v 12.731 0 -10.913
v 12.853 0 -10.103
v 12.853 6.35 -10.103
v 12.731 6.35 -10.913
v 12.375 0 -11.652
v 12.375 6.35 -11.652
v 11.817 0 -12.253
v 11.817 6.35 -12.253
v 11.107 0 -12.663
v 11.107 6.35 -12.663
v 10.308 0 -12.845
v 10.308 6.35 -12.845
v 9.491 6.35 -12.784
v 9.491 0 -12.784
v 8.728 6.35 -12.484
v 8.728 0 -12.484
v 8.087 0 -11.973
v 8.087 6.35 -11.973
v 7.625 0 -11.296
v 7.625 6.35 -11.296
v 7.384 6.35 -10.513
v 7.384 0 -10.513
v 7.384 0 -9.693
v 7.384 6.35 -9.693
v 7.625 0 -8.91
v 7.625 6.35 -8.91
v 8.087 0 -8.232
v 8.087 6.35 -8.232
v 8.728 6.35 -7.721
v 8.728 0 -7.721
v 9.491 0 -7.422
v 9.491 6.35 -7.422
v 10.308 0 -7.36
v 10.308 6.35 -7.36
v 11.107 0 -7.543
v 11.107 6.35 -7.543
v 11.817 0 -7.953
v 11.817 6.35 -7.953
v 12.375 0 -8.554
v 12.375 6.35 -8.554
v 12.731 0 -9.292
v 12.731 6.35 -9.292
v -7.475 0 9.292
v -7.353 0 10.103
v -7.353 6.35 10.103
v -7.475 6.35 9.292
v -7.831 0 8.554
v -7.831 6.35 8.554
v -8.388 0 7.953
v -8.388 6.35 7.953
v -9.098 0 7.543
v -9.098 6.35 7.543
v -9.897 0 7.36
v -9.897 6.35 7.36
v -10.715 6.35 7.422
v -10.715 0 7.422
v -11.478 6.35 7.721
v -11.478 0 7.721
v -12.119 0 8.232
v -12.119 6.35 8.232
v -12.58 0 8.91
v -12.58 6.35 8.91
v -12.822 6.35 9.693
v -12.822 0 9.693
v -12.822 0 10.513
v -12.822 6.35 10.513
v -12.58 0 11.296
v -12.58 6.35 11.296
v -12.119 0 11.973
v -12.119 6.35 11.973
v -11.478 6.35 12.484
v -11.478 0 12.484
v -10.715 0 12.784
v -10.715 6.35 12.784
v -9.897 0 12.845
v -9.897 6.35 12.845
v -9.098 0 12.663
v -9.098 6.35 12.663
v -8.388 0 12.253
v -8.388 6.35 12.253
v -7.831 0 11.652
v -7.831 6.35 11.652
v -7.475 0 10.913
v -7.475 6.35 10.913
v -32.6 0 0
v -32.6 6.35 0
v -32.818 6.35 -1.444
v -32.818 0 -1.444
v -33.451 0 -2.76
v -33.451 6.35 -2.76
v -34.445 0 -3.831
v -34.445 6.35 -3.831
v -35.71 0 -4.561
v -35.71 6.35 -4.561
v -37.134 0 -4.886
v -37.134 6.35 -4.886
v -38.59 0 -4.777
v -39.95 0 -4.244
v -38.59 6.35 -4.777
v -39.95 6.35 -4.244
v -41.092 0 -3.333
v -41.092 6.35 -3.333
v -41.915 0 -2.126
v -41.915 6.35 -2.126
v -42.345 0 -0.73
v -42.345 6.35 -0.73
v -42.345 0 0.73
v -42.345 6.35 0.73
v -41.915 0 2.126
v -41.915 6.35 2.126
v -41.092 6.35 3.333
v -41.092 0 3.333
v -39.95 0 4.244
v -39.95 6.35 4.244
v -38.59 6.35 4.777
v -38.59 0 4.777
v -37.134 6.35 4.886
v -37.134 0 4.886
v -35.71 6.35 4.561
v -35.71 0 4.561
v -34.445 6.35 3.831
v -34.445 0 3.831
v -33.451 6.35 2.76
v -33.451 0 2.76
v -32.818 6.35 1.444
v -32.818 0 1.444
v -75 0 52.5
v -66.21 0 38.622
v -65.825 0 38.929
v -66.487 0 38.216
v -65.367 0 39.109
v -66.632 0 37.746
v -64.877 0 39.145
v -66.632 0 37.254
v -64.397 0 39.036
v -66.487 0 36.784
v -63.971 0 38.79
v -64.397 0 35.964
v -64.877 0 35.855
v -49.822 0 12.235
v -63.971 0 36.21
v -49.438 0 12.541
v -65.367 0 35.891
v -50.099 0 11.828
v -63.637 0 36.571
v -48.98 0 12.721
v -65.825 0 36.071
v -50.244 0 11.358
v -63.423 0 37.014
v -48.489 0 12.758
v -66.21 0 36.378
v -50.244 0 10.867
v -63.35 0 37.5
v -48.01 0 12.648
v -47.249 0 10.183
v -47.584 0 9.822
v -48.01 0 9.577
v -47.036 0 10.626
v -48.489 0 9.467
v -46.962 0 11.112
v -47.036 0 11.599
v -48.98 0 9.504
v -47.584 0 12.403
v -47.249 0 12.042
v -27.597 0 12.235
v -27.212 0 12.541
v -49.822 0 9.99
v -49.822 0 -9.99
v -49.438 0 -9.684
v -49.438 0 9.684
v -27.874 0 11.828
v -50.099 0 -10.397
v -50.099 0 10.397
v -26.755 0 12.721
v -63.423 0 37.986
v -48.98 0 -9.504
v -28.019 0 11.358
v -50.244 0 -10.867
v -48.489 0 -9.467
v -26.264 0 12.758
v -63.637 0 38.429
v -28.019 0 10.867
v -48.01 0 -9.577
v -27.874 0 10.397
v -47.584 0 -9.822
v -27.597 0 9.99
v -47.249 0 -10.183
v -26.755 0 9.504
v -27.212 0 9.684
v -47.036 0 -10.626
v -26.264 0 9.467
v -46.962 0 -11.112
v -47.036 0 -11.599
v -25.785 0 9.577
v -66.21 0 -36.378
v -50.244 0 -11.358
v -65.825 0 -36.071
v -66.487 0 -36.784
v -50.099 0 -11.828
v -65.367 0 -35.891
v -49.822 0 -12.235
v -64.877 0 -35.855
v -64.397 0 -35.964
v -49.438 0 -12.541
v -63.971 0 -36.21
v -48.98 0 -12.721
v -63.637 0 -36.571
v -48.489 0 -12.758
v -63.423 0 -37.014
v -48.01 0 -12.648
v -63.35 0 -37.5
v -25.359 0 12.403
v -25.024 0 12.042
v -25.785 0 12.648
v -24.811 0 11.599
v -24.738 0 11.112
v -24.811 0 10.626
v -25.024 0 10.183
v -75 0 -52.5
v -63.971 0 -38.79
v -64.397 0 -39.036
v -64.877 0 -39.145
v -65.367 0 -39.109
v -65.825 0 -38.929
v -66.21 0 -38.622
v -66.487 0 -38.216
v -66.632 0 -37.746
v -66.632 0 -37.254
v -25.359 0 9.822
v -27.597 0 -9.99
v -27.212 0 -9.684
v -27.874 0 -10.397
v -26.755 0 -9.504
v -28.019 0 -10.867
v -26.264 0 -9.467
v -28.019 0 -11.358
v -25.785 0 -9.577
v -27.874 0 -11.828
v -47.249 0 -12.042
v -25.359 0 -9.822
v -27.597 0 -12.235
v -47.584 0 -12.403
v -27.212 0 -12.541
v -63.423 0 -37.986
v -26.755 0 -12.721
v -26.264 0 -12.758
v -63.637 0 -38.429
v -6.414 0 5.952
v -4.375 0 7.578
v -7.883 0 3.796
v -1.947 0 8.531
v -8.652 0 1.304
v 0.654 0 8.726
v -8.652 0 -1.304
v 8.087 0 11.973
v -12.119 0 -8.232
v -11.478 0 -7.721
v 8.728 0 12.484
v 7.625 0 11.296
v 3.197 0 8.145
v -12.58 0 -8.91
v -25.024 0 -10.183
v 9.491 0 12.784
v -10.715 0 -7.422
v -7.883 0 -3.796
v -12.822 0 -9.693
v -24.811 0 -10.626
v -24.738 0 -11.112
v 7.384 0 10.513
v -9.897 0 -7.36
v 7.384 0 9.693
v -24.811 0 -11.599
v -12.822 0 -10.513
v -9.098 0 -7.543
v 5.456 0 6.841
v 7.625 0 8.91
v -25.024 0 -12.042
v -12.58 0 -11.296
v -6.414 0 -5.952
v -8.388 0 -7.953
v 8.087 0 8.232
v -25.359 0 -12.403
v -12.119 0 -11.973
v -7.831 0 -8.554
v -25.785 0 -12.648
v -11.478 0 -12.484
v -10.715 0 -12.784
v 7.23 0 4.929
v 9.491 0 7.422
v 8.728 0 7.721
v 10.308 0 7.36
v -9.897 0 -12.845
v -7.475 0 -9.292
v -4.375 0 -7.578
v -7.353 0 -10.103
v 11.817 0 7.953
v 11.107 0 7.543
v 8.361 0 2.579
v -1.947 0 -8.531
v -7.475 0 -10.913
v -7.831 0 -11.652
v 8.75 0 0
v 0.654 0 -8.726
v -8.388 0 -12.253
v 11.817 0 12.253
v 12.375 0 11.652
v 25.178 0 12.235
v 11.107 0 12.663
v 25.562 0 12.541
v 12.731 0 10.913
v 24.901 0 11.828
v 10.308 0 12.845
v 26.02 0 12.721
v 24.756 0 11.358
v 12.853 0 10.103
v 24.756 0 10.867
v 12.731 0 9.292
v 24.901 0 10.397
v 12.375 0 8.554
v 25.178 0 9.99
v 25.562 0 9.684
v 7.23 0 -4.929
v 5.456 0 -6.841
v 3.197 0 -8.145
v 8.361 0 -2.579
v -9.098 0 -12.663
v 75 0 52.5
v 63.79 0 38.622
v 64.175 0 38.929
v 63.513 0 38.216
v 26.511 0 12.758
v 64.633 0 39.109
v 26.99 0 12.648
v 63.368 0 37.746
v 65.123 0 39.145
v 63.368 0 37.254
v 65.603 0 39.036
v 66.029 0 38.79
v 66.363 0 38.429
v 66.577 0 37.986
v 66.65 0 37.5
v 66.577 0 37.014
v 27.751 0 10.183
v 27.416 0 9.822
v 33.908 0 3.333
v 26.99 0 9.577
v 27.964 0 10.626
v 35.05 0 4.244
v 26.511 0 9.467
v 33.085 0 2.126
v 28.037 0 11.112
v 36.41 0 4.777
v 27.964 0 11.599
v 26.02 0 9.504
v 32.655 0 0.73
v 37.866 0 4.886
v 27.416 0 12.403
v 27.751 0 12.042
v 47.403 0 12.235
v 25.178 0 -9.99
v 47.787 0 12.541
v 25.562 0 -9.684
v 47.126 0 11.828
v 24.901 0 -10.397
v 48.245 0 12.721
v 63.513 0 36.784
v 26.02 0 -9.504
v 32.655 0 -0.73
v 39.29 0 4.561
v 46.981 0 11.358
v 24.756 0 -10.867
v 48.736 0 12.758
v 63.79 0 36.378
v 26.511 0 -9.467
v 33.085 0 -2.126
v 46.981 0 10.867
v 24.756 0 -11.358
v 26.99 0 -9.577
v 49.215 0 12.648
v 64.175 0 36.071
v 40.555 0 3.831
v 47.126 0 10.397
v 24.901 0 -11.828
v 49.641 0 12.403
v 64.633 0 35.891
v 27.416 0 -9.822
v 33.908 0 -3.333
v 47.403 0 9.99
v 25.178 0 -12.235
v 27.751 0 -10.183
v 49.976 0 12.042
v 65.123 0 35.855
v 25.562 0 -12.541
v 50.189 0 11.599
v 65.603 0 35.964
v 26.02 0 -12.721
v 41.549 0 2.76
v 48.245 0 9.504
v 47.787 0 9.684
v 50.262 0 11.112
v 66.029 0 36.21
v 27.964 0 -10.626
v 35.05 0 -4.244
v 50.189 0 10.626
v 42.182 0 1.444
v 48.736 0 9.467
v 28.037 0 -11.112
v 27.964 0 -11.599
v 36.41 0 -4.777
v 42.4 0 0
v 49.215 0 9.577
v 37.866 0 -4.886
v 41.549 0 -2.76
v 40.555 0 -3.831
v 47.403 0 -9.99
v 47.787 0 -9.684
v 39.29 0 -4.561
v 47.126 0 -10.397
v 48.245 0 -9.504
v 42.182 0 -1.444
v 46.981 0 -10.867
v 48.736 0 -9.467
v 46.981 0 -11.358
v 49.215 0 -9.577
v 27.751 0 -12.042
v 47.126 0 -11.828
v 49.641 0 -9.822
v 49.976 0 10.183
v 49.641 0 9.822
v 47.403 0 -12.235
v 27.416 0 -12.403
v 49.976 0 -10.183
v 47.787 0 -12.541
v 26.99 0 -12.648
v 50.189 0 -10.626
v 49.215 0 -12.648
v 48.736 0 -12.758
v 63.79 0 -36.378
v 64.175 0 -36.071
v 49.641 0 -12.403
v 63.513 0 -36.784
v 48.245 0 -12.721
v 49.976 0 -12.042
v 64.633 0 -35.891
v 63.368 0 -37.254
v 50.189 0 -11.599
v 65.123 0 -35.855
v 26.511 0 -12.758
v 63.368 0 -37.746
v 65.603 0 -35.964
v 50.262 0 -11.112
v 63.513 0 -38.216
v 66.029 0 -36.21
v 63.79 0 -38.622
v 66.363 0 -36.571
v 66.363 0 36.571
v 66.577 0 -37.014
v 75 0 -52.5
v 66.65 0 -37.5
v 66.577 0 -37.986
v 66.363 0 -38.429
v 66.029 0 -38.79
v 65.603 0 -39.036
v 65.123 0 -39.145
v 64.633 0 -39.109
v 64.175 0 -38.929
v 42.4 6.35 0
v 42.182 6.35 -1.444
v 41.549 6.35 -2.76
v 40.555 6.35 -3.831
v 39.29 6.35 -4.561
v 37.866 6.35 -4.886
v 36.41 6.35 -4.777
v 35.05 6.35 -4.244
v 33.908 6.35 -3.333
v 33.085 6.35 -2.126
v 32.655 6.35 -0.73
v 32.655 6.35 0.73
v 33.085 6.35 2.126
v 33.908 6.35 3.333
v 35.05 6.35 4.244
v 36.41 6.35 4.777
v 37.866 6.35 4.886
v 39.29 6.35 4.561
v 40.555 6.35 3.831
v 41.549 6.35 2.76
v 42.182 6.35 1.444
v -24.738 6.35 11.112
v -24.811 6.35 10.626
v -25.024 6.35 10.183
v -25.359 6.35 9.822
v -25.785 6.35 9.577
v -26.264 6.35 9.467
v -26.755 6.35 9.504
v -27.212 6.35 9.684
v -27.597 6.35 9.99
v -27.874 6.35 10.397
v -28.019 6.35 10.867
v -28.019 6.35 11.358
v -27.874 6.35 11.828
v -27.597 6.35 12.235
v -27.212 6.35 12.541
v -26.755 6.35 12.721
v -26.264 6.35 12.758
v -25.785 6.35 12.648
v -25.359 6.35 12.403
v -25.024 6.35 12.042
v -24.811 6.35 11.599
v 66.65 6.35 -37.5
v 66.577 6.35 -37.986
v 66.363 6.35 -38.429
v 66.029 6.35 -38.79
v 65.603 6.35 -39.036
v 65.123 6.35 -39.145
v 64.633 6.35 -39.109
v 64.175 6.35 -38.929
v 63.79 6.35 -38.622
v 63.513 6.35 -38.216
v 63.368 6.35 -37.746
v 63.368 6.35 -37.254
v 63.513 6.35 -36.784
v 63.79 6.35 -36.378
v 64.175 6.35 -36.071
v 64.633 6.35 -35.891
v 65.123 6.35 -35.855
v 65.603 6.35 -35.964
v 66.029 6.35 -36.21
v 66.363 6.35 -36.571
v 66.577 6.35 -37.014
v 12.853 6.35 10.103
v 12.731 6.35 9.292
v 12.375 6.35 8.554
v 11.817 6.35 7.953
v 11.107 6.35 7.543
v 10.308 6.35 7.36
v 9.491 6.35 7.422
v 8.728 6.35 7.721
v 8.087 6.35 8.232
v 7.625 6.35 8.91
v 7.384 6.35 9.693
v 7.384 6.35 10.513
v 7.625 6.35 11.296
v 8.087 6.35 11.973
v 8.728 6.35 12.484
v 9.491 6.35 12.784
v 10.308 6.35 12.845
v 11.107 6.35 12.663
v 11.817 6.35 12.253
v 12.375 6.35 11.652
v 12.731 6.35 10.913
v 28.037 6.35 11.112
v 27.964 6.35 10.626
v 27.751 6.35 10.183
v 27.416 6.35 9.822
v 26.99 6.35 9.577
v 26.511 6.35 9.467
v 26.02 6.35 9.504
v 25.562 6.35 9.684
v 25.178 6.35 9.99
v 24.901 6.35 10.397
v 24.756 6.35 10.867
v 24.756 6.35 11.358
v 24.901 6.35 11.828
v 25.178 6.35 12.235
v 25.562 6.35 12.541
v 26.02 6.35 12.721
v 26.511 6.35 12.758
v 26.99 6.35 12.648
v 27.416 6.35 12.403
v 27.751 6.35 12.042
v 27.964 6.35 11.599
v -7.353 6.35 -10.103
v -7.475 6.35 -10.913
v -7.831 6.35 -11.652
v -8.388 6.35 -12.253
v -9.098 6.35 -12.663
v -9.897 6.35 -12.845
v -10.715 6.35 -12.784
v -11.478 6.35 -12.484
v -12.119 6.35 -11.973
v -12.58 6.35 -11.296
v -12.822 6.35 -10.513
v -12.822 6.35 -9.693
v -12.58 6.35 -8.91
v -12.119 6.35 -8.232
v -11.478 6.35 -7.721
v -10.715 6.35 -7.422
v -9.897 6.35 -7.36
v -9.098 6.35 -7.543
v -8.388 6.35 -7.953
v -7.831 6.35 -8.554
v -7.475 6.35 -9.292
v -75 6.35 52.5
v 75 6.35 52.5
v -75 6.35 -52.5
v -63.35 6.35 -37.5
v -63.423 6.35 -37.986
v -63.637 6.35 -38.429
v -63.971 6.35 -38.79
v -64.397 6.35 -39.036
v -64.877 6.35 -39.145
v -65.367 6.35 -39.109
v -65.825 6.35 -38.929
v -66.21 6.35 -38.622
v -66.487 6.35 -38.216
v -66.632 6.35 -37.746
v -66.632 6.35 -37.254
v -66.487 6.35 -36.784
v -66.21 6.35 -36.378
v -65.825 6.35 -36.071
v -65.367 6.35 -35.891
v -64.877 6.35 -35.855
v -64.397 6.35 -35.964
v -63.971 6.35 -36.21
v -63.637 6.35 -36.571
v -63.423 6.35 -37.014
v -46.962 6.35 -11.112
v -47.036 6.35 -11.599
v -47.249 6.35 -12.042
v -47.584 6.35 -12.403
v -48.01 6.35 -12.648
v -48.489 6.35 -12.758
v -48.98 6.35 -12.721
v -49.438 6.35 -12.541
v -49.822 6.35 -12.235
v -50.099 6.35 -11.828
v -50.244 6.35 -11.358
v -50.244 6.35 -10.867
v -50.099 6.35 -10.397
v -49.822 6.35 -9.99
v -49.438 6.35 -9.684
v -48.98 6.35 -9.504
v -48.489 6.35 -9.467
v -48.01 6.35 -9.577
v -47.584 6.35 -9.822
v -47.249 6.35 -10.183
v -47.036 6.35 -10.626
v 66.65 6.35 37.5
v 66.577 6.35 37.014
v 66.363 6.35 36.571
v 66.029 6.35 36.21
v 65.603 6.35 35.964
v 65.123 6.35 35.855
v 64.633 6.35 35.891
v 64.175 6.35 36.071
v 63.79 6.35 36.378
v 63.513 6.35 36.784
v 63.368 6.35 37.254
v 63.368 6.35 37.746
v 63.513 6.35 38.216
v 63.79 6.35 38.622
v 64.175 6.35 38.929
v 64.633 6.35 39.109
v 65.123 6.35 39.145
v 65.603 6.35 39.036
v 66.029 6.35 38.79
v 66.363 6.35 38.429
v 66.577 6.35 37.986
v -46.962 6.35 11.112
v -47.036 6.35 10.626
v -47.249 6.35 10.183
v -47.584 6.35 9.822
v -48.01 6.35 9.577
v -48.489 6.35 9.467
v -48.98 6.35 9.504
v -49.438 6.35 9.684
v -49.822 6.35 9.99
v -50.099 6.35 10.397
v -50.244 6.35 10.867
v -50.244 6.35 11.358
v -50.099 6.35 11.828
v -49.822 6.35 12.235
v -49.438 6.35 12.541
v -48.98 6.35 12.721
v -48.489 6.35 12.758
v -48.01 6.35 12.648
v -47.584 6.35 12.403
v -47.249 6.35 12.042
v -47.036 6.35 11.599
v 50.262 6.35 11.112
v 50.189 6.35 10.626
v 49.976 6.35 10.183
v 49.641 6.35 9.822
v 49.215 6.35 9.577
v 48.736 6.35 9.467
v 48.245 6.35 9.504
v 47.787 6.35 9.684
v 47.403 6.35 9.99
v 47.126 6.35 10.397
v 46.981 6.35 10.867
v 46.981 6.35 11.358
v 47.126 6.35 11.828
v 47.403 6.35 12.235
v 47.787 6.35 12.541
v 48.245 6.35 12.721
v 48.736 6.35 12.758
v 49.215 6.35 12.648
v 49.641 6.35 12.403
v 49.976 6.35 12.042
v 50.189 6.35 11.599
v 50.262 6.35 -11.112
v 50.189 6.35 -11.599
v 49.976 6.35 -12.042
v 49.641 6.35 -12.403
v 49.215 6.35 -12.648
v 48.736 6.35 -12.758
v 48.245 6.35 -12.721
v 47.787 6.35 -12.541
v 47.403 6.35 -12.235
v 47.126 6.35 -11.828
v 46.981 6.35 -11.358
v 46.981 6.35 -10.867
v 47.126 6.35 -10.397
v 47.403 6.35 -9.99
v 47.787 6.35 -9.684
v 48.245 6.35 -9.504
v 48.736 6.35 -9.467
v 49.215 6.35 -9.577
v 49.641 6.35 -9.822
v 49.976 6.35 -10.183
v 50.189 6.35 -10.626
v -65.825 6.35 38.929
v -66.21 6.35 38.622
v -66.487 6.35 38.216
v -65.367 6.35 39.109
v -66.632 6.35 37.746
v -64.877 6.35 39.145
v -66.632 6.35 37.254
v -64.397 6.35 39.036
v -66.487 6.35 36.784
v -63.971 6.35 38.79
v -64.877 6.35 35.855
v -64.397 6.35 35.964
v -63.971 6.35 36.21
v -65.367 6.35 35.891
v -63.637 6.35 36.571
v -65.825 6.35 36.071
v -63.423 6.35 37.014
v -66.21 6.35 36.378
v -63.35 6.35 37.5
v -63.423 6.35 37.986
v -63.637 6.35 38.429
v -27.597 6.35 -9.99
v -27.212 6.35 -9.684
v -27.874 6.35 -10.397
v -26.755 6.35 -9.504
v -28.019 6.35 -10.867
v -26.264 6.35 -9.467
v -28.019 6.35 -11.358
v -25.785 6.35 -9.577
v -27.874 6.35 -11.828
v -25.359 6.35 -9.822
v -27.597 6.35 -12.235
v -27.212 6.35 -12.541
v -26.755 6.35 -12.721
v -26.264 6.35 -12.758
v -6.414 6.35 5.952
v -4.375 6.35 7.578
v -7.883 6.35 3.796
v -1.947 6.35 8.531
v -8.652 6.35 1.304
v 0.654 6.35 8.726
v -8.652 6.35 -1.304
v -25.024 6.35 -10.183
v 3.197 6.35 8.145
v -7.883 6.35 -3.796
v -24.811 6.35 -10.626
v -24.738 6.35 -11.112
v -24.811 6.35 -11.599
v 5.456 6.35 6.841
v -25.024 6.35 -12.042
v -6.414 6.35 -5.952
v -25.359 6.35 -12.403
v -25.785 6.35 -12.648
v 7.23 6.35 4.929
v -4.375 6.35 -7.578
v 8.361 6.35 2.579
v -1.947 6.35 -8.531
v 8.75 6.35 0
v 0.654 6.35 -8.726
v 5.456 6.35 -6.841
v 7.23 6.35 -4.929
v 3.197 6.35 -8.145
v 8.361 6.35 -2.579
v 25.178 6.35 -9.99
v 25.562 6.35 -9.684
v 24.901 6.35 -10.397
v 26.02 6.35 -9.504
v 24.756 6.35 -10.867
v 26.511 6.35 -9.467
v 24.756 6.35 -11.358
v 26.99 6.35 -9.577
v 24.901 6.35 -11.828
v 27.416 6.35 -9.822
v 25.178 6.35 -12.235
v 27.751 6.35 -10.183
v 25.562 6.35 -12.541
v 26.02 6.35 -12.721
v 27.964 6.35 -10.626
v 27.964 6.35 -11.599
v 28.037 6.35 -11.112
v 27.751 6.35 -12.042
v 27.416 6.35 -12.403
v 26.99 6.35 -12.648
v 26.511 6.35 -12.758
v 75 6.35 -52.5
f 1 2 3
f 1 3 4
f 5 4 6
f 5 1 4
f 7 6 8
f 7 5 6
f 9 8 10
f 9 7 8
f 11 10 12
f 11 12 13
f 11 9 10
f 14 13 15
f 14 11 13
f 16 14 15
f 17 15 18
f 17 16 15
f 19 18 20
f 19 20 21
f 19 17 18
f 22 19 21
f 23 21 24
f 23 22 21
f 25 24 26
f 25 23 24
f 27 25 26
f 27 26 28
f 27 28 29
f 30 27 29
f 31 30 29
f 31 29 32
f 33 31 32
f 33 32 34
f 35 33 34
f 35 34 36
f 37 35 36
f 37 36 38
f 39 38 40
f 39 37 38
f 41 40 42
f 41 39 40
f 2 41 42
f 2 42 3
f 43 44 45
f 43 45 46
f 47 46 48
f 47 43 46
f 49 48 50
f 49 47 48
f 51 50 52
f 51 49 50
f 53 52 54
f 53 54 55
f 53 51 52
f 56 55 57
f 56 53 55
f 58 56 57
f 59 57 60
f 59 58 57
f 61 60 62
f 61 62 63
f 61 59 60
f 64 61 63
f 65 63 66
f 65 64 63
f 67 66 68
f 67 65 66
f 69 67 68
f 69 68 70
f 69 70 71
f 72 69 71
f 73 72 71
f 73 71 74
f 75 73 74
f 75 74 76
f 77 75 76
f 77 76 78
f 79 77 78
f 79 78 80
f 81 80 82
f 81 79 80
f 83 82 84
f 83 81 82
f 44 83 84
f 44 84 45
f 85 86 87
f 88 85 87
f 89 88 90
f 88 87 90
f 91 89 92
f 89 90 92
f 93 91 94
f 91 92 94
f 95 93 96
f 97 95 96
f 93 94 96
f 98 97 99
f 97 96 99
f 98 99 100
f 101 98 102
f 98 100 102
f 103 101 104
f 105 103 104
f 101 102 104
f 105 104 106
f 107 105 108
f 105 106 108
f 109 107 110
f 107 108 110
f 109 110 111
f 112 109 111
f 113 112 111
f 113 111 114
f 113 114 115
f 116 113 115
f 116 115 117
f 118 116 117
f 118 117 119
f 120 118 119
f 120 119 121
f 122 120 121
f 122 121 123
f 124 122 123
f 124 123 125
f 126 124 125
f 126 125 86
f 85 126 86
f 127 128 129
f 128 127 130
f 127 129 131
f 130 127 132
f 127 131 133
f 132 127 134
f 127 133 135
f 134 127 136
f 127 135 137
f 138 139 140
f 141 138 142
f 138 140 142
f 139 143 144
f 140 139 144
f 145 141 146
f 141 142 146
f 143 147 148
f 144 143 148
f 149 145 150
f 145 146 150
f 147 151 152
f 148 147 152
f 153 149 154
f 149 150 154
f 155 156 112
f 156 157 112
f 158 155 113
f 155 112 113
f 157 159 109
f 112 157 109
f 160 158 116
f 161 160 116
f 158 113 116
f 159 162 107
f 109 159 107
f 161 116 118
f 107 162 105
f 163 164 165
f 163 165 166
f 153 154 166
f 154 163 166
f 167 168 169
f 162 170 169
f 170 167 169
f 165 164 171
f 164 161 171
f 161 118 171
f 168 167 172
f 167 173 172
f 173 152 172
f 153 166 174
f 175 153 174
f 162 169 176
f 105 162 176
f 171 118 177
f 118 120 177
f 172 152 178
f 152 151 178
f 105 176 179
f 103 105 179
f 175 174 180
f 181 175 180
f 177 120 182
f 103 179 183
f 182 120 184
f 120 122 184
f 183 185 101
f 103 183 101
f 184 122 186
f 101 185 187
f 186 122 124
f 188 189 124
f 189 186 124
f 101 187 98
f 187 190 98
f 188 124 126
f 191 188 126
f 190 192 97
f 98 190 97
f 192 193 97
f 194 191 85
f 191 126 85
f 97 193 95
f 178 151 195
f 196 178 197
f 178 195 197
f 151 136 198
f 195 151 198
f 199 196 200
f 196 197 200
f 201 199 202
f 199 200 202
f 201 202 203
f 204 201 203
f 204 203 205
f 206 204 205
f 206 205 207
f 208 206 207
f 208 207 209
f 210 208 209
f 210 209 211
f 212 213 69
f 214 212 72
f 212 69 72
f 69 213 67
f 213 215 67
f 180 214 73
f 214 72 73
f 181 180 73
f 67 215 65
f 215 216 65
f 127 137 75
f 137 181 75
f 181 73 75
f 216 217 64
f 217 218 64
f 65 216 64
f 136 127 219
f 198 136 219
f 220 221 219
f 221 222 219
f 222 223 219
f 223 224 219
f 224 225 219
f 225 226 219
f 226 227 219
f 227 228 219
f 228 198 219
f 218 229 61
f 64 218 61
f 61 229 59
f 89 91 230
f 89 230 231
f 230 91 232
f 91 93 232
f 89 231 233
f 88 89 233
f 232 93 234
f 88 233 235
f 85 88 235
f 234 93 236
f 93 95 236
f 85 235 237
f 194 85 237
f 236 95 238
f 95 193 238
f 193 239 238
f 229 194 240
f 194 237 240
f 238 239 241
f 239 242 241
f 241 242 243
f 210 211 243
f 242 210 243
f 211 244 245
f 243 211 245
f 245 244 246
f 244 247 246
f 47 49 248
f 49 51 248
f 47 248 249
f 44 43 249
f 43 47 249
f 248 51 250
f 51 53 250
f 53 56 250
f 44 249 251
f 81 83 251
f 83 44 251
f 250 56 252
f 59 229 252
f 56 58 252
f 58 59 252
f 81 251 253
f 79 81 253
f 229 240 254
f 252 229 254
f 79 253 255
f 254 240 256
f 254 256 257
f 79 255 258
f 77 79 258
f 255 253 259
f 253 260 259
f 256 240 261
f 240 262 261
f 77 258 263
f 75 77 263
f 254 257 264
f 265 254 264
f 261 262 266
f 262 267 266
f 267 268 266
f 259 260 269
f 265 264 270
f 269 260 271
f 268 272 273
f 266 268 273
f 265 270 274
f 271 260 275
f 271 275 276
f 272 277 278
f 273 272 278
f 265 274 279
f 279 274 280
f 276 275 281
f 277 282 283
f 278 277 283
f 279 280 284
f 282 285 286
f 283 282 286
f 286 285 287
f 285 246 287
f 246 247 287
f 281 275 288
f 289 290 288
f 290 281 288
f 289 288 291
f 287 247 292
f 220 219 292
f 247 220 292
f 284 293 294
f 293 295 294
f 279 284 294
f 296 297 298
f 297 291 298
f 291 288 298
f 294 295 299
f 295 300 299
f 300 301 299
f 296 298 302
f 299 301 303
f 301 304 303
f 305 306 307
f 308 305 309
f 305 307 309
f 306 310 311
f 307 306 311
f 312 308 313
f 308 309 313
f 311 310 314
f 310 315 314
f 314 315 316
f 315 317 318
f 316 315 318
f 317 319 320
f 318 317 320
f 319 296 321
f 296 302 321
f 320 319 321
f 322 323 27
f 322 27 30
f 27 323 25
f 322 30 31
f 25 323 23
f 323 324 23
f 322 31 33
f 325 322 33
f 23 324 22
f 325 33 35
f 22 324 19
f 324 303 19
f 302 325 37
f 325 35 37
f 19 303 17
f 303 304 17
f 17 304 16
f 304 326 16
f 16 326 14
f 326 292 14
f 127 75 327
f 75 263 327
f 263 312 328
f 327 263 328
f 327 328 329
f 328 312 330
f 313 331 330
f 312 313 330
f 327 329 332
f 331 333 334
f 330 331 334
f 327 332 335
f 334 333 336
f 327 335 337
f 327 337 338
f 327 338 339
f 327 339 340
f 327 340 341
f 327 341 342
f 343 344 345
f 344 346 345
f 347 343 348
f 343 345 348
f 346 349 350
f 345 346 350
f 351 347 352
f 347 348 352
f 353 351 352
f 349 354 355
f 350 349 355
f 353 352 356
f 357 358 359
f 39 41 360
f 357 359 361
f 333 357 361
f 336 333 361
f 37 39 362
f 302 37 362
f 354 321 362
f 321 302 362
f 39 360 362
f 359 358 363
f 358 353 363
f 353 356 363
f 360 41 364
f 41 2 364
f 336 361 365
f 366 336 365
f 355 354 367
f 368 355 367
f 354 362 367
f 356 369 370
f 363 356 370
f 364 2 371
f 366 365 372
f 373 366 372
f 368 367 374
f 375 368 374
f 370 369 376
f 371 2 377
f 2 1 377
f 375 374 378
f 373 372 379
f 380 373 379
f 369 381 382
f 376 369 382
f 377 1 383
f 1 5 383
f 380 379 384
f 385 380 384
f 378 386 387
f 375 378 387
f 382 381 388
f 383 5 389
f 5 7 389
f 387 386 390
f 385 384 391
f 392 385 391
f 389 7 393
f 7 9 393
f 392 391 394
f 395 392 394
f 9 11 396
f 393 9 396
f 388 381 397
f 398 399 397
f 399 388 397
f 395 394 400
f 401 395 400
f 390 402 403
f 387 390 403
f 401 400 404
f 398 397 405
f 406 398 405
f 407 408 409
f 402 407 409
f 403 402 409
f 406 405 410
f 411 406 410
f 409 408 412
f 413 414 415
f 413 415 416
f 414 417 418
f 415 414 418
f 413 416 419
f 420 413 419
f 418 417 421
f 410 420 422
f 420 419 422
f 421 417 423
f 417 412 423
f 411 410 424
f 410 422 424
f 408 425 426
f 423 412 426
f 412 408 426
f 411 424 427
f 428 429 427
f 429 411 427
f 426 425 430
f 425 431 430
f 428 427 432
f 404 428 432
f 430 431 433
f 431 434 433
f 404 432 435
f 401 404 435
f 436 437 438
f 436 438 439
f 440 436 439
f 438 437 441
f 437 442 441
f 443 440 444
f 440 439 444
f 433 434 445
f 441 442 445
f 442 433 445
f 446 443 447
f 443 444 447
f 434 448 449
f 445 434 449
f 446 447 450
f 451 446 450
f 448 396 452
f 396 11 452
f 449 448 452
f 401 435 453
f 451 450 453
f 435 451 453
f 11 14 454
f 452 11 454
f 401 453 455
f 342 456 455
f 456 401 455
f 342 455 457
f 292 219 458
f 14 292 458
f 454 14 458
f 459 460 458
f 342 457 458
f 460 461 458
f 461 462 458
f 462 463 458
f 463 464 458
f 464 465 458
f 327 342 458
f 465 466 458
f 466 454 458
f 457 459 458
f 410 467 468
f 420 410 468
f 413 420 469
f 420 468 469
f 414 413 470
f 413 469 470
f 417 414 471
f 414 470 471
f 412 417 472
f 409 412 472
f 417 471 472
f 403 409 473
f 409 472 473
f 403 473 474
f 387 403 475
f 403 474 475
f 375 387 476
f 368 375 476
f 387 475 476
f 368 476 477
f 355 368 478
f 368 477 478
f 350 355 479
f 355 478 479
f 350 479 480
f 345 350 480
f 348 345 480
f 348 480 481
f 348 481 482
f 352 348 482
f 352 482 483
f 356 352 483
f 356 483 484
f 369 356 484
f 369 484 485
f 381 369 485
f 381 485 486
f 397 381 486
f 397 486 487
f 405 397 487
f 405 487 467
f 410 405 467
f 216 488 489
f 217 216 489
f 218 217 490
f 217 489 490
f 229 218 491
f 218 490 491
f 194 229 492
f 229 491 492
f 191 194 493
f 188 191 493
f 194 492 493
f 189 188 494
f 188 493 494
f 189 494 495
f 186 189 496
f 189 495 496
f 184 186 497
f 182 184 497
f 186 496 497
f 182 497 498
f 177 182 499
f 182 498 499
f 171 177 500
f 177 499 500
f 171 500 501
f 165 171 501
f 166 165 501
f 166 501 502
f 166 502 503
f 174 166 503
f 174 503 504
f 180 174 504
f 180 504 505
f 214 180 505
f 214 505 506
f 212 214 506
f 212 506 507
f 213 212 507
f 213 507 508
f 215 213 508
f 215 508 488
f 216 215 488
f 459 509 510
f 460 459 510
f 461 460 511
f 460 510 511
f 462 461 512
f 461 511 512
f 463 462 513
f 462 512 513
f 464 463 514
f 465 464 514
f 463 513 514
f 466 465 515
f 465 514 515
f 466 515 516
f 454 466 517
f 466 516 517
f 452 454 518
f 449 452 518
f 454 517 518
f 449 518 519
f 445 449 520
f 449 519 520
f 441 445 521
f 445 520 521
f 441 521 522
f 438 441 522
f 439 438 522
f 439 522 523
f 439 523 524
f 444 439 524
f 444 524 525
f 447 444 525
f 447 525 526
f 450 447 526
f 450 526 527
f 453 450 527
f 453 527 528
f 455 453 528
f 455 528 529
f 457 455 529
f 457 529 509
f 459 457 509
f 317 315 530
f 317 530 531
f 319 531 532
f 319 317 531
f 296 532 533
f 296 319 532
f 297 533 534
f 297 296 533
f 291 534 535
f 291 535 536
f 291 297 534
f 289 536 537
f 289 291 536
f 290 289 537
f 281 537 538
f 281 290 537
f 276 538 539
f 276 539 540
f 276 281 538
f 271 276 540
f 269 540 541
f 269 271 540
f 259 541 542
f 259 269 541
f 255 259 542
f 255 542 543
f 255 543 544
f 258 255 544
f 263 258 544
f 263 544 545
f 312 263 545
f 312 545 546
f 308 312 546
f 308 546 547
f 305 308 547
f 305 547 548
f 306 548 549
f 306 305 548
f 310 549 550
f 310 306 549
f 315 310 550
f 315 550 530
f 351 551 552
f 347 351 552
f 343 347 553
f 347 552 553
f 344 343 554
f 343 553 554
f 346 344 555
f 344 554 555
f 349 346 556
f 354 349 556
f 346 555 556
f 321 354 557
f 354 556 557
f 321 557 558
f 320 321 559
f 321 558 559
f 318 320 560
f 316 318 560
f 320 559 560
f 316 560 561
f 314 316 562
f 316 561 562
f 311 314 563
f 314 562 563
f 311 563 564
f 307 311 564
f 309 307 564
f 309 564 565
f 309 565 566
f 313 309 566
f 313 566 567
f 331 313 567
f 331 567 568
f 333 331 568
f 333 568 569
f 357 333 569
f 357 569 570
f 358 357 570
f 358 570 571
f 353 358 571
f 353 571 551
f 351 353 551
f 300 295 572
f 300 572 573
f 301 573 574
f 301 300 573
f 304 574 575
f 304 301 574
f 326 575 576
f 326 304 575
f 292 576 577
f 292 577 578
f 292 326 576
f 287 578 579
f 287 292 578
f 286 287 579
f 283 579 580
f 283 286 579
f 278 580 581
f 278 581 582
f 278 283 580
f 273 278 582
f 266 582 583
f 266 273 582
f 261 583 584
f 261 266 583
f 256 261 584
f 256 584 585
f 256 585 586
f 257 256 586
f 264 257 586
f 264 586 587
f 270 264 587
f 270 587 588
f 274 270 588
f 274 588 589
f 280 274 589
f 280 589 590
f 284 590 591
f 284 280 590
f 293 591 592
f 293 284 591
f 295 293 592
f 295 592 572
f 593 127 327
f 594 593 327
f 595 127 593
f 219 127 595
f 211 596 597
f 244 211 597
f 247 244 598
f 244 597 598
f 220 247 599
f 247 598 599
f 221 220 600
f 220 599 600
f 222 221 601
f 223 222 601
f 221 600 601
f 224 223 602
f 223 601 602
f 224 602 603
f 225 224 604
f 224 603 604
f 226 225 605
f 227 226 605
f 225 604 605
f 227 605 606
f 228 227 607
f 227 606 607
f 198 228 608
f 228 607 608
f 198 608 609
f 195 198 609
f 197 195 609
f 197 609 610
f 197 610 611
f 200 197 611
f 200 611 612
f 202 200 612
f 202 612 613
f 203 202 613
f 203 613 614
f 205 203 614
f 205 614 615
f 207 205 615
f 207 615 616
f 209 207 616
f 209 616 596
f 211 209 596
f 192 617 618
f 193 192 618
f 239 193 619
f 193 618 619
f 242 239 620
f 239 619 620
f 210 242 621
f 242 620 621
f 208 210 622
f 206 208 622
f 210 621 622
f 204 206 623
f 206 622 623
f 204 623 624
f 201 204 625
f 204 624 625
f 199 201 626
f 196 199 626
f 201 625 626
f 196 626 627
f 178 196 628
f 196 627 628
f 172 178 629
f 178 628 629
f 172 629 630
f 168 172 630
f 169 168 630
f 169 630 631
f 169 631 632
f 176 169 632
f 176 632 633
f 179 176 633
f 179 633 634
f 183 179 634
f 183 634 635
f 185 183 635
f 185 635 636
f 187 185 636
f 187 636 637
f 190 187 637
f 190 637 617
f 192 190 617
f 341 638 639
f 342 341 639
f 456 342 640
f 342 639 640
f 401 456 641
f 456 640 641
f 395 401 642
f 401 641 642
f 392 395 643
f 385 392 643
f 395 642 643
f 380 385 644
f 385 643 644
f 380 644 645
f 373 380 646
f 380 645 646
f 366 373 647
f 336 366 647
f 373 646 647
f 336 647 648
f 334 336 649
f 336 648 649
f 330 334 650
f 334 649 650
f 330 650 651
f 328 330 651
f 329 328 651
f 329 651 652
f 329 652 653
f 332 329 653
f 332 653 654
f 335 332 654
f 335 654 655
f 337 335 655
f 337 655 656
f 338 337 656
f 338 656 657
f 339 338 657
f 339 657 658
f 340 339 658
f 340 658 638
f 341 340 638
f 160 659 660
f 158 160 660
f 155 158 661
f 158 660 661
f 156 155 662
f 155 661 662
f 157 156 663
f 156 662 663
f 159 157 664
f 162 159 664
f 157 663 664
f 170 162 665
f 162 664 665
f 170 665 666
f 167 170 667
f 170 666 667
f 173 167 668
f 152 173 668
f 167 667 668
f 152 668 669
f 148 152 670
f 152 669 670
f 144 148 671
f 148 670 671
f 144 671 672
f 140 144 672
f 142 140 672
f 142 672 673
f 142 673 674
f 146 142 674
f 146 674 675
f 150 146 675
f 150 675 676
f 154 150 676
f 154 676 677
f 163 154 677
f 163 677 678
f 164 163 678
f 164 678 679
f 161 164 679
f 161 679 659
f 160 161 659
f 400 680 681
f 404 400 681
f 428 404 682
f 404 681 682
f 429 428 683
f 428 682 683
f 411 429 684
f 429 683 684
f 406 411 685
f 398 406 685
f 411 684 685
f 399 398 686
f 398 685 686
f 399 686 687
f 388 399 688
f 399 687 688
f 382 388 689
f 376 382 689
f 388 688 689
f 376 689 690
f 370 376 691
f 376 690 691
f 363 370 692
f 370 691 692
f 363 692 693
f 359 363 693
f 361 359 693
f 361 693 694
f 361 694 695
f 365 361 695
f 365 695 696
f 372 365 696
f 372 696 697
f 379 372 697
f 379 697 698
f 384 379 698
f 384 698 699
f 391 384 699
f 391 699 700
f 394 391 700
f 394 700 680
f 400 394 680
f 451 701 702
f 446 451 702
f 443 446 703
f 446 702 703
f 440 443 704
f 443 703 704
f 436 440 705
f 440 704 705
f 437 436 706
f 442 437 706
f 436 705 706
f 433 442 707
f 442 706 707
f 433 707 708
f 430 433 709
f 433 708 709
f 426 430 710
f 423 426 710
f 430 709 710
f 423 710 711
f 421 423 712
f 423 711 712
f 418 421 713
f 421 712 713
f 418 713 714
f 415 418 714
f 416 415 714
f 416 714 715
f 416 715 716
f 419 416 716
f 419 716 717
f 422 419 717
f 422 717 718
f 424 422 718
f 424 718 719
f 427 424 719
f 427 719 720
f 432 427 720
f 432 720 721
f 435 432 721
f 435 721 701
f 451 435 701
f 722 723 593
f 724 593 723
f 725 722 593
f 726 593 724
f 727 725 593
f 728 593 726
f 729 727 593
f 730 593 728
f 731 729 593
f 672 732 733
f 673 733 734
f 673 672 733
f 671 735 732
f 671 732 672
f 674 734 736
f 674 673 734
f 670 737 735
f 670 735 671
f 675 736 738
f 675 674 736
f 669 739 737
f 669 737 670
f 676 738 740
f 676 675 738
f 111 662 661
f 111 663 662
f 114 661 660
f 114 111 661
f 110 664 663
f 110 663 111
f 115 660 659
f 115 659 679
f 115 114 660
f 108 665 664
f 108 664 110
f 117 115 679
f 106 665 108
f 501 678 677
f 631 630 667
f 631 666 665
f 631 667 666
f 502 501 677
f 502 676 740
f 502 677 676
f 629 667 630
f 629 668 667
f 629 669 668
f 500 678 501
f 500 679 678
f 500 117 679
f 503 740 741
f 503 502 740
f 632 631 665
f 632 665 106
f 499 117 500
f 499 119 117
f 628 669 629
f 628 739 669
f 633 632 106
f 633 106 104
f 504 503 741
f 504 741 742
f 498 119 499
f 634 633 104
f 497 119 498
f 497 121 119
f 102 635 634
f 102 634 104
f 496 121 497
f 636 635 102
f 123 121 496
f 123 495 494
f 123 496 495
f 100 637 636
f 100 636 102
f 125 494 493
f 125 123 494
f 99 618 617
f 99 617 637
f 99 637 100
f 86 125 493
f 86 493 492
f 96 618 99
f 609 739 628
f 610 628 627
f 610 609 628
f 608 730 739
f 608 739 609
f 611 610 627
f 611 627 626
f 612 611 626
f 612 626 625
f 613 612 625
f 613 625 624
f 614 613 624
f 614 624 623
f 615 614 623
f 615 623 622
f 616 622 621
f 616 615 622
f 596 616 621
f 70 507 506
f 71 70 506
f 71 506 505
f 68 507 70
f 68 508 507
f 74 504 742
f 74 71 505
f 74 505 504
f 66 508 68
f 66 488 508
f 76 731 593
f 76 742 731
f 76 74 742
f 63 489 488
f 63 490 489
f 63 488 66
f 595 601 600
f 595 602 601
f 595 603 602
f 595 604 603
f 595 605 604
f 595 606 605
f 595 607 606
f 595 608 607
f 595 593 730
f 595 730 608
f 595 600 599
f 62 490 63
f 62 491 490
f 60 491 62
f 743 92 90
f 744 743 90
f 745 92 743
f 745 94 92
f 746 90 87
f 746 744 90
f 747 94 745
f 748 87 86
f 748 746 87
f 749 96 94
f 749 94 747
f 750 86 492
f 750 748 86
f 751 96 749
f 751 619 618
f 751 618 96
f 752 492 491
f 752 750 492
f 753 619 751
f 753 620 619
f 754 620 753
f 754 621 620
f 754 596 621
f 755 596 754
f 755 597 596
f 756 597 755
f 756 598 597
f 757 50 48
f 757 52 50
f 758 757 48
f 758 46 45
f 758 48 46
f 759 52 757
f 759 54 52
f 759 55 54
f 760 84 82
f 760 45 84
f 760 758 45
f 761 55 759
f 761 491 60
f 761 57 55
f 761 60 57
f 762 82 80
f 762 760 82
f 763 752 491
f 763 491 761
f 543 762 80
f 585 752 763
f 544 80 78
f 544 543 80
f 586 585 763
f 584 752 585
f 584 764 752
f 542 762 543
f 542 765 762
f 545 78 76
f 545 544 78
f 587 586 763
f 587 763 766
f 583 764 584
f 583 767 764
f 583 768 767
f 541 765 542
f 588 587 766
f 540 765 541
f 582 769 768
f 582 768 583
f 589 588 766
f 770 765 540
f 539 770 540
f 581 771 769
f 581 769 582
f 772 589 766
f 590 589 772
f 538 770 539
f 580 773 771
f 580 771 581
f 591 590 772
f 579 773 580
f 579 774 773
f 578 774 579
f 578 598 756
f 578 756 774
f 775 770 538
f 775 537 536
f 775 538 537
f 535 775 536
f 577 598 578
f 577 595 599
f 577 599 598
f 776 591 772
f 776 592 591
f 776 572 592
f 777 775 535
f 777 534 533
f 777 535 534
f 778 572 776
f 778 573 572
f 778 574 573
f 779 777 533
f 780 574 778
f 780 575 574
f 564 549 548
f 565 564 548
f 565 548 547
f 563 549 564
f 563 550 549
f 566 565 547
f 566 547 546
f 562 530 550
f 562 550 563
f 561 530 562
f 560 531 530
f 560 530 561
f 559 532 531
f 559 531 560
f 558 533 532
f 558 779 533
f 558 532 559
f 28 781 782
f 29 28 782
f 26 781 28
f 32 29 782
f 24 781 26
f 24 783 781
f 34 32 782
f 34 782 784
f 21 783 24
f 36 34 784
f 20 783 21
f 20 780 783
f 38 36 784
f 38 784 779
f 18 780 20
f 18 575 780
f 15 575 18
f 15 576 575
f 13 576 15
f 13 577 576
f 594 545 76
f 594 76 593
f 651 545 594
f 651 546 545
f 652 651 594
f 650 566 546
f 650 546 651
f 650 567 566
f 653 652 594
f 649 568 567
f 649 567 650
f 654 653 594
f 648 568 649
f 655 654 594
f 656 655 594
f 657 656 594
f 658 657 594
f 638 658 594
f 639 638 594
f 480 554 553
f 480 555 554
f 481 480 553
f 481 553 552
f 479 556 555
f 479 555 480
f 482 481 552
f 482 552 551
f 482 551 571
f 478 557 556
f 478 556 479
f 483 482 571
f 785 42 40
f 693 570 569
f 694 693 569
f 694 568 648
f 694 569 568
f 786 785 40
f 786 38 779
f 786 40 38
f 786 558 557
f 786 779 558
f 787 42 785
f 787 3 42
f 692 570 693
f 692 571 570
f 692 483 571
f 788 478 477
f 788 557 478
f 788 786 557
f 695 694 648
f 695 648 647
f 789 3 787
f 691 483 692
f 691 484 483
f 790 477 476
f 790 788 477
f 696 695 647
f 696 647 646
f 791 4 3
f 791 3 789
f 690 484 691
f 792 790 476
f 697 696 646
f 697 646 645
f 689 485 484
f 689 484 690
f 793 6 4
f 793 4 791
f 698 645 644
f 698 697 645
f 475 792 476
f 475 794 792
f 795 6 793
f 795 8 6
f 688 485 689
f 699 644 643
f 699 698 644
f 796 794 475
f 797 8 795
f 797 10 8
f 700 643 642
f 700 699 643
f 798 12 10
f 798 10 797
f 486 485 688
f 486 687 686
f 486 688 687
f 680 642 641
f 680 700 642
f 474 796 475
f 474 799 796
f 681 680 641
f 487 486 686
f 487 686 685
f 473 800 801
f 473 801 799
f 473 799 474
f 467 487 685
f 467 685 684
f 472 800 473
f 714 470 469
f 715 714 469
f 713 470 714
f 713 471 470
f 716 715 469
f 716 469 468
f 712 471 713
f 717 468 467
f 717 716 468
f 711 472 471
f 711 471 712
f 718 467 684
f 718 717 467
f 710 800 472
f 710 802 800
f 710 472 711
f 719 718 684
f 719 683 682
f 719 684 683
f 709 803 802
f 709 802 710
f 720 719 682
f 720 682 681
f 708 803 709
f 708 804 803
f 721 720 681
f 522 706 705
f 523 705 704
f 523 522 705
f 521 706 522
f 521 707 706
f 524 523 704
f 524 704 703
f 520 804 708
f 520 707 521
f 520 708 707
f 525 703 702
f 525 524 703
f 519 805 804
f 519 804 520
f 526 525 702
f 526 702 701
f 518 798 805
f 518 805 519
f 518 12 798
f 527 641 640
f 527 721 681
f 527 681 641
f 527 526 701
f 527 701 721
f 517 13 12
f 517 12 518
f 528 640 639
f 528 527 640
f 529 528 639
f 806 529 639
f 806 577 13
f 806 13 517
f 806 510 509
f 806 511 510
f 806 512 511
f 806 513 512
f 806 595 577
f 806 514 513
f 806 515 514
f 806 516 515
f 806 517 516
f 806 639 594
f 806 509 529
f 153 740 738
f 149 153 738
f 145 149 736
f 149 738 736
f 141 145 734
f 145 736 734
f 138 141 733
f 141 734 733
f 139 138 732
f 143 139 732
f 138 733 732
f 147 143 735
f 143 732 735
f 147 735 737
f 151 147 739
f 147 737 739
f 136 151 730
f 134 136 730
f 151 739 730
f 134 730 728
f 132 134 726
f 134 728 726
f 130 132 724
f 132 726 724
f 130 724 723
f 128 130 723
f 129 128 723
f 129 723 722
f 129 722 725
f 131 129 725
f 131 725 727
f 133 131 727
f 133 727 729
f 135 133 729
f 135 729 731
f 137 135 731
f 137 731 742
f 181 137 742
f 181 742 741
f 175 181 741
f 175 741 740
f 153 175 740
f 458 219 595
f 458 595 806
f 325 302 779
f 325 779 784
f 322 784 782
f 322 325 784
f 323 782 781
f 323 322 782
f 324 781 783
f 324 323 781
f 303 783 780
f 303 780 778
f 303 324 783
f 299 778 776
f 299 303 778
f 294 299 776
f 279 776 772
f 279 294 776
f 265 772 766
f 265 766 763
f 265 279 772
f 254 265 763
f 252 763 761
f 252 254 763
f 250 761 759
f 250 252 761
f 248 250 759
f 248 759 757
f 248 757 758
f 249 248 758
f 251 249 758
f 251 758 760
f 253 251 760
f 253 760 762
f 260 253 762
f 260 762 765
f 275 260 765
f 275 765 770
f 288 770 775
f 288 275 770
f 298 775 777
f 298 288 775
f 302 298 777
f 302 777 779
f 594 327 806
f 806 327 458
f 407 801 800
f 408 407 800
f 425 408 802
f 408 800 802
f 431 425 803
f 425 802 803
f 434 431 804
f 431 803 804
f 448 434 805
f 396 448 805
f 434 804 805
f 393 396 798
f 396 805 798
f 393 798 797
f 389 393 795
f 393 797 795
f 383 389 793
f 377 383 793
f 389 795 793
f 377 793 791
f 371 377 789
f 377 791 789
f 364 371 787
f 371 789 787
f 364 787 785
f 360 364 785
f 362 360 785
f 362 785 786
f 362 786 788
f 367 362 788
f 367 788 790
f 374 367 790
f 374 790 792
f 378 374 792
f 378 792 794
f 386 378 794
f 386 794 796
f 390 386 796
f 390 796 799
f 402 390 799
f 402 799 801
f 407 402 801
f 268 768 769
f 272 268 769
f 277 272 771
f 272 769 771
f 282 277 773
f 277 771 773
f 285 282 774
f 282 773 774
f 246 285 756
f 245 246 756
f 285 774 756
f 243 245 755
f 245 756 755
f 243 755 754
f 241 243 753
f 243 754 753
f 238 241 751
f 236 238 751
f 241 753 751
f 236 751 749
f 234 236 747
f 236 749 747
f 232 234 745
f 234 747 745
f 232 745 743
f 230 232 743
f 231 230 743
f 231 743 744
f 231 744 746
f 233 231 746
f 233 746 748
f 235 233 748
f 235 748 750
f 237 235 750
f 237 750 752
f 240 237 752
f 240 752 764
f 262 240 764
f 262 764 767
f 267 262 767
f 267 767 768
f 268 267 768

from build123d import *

# Parameters (mm, degrees)
SKETCH1_W            = 150
SKETCH1_H            = 105
SKETCH1_R            = 8.75
SKETCH1_R_2          = 2.75
BASE_DEPTH           = 6.35
SKETCH3_R            = 4.9
SKETCH3_R_2          = 1.65
BEARING_HOLES_DEPTH  = 7.35
SKETCH2_R            = 1.65
MOUNTING_HOLES_DEPTH = 7.35


with BuildPart() as part:
    # Sketch1 → Base (new body)
    with BuildSketch(Plane(origin=(0, 0, 0), x_dir=(1, 0, 0), z_dir=(0, 1, 0))):
        Rectangle(SKETCH1_W, SKETCH1_H)
        Circle(SKETCH1_R, mode=Mode.SUBTRACT)
        with Locations((10.102788136, 10.102788136)):
            Circle(SKETCH1_R_2, mode=Mode.SUBTRACT)
        with Locations((10.102788136, -10.102788136)):
            Circle(SKETCH1_R_2, mode=Mode.SUBTRACT)
        with Locations((-10.102788136, -10.102788136)):
            Circle(SKETCH1_R_2, mode=Mode.SUBTRACT)
        with Locations((-10.102788136, 10.102788136)):
            Circle(SKETCH1_R_2, mode=Mode.SUBTRACT)
    extrude(amount=BASE_DEPTH)

    # Sketch3 → Bearing Holes (cut, through all)
    with BuildSketch(Plane(origin=(0, 6.35, 0), x_dir=(1, 0, 0), z_dir=(0, 1, 0))):
        with Locations((37.5, 0)):
            Circle(SKETCH3_R)
        with Locations((26.3875, 11.1125)):
            Circle(SKETCH3_R_2)
        with Locations((48.6125, 11.1125)):
            Circle(SKETCH3_R_2)
        with Locations((48.6125, -11.1125)):
            Circle(SKETCH3_R_2)
        with Locations((26.3875, -11.1125)):
            Circle(SKETCH3_R_2)
        with Locations((-26.3875, -11.1125)):
            Circle(SKETCH3_R_2)
        with Locations((-48.6125, -11.1125)):
            Circle(SKETCH3_R_2)
        with Locations((-48.6125, 11.1125)):
            Circle(SKETCH3_R_2)
        with Locations((-26.3875, 11.1125)):
            Circle(SKETCH3_R_2)
        with Locations((-37.5, 0)):
            Circle(SKETCH3_R)
    extrude(amount=-BEARING_HOLES_DEPTH, mode=Mode.SUBTRACT)

    # Sketch2 → Mounting Holes (cut, through all)
    with BuildSketch(Plane(origin=(0, 6.35, 0), x_dir=(1, 0, 0), z_dir=(0, 1, 0))):
        with Locations((-65, 37.5)):
            Circle(SKETCH2_R)
        with Locations((-65, -37.5)):
            Circle(SKETCH2_R)
        with Locations((65, -37.5)):
            Circle(SKETCH2_R)
        with Locations((65, 37.5)):
            Circle(SKETCH2_R)
    extrude(amount=-MOUNTING_HOLES_DEPTH, mode=Mode.SUBTRACT)


solid = part.part
